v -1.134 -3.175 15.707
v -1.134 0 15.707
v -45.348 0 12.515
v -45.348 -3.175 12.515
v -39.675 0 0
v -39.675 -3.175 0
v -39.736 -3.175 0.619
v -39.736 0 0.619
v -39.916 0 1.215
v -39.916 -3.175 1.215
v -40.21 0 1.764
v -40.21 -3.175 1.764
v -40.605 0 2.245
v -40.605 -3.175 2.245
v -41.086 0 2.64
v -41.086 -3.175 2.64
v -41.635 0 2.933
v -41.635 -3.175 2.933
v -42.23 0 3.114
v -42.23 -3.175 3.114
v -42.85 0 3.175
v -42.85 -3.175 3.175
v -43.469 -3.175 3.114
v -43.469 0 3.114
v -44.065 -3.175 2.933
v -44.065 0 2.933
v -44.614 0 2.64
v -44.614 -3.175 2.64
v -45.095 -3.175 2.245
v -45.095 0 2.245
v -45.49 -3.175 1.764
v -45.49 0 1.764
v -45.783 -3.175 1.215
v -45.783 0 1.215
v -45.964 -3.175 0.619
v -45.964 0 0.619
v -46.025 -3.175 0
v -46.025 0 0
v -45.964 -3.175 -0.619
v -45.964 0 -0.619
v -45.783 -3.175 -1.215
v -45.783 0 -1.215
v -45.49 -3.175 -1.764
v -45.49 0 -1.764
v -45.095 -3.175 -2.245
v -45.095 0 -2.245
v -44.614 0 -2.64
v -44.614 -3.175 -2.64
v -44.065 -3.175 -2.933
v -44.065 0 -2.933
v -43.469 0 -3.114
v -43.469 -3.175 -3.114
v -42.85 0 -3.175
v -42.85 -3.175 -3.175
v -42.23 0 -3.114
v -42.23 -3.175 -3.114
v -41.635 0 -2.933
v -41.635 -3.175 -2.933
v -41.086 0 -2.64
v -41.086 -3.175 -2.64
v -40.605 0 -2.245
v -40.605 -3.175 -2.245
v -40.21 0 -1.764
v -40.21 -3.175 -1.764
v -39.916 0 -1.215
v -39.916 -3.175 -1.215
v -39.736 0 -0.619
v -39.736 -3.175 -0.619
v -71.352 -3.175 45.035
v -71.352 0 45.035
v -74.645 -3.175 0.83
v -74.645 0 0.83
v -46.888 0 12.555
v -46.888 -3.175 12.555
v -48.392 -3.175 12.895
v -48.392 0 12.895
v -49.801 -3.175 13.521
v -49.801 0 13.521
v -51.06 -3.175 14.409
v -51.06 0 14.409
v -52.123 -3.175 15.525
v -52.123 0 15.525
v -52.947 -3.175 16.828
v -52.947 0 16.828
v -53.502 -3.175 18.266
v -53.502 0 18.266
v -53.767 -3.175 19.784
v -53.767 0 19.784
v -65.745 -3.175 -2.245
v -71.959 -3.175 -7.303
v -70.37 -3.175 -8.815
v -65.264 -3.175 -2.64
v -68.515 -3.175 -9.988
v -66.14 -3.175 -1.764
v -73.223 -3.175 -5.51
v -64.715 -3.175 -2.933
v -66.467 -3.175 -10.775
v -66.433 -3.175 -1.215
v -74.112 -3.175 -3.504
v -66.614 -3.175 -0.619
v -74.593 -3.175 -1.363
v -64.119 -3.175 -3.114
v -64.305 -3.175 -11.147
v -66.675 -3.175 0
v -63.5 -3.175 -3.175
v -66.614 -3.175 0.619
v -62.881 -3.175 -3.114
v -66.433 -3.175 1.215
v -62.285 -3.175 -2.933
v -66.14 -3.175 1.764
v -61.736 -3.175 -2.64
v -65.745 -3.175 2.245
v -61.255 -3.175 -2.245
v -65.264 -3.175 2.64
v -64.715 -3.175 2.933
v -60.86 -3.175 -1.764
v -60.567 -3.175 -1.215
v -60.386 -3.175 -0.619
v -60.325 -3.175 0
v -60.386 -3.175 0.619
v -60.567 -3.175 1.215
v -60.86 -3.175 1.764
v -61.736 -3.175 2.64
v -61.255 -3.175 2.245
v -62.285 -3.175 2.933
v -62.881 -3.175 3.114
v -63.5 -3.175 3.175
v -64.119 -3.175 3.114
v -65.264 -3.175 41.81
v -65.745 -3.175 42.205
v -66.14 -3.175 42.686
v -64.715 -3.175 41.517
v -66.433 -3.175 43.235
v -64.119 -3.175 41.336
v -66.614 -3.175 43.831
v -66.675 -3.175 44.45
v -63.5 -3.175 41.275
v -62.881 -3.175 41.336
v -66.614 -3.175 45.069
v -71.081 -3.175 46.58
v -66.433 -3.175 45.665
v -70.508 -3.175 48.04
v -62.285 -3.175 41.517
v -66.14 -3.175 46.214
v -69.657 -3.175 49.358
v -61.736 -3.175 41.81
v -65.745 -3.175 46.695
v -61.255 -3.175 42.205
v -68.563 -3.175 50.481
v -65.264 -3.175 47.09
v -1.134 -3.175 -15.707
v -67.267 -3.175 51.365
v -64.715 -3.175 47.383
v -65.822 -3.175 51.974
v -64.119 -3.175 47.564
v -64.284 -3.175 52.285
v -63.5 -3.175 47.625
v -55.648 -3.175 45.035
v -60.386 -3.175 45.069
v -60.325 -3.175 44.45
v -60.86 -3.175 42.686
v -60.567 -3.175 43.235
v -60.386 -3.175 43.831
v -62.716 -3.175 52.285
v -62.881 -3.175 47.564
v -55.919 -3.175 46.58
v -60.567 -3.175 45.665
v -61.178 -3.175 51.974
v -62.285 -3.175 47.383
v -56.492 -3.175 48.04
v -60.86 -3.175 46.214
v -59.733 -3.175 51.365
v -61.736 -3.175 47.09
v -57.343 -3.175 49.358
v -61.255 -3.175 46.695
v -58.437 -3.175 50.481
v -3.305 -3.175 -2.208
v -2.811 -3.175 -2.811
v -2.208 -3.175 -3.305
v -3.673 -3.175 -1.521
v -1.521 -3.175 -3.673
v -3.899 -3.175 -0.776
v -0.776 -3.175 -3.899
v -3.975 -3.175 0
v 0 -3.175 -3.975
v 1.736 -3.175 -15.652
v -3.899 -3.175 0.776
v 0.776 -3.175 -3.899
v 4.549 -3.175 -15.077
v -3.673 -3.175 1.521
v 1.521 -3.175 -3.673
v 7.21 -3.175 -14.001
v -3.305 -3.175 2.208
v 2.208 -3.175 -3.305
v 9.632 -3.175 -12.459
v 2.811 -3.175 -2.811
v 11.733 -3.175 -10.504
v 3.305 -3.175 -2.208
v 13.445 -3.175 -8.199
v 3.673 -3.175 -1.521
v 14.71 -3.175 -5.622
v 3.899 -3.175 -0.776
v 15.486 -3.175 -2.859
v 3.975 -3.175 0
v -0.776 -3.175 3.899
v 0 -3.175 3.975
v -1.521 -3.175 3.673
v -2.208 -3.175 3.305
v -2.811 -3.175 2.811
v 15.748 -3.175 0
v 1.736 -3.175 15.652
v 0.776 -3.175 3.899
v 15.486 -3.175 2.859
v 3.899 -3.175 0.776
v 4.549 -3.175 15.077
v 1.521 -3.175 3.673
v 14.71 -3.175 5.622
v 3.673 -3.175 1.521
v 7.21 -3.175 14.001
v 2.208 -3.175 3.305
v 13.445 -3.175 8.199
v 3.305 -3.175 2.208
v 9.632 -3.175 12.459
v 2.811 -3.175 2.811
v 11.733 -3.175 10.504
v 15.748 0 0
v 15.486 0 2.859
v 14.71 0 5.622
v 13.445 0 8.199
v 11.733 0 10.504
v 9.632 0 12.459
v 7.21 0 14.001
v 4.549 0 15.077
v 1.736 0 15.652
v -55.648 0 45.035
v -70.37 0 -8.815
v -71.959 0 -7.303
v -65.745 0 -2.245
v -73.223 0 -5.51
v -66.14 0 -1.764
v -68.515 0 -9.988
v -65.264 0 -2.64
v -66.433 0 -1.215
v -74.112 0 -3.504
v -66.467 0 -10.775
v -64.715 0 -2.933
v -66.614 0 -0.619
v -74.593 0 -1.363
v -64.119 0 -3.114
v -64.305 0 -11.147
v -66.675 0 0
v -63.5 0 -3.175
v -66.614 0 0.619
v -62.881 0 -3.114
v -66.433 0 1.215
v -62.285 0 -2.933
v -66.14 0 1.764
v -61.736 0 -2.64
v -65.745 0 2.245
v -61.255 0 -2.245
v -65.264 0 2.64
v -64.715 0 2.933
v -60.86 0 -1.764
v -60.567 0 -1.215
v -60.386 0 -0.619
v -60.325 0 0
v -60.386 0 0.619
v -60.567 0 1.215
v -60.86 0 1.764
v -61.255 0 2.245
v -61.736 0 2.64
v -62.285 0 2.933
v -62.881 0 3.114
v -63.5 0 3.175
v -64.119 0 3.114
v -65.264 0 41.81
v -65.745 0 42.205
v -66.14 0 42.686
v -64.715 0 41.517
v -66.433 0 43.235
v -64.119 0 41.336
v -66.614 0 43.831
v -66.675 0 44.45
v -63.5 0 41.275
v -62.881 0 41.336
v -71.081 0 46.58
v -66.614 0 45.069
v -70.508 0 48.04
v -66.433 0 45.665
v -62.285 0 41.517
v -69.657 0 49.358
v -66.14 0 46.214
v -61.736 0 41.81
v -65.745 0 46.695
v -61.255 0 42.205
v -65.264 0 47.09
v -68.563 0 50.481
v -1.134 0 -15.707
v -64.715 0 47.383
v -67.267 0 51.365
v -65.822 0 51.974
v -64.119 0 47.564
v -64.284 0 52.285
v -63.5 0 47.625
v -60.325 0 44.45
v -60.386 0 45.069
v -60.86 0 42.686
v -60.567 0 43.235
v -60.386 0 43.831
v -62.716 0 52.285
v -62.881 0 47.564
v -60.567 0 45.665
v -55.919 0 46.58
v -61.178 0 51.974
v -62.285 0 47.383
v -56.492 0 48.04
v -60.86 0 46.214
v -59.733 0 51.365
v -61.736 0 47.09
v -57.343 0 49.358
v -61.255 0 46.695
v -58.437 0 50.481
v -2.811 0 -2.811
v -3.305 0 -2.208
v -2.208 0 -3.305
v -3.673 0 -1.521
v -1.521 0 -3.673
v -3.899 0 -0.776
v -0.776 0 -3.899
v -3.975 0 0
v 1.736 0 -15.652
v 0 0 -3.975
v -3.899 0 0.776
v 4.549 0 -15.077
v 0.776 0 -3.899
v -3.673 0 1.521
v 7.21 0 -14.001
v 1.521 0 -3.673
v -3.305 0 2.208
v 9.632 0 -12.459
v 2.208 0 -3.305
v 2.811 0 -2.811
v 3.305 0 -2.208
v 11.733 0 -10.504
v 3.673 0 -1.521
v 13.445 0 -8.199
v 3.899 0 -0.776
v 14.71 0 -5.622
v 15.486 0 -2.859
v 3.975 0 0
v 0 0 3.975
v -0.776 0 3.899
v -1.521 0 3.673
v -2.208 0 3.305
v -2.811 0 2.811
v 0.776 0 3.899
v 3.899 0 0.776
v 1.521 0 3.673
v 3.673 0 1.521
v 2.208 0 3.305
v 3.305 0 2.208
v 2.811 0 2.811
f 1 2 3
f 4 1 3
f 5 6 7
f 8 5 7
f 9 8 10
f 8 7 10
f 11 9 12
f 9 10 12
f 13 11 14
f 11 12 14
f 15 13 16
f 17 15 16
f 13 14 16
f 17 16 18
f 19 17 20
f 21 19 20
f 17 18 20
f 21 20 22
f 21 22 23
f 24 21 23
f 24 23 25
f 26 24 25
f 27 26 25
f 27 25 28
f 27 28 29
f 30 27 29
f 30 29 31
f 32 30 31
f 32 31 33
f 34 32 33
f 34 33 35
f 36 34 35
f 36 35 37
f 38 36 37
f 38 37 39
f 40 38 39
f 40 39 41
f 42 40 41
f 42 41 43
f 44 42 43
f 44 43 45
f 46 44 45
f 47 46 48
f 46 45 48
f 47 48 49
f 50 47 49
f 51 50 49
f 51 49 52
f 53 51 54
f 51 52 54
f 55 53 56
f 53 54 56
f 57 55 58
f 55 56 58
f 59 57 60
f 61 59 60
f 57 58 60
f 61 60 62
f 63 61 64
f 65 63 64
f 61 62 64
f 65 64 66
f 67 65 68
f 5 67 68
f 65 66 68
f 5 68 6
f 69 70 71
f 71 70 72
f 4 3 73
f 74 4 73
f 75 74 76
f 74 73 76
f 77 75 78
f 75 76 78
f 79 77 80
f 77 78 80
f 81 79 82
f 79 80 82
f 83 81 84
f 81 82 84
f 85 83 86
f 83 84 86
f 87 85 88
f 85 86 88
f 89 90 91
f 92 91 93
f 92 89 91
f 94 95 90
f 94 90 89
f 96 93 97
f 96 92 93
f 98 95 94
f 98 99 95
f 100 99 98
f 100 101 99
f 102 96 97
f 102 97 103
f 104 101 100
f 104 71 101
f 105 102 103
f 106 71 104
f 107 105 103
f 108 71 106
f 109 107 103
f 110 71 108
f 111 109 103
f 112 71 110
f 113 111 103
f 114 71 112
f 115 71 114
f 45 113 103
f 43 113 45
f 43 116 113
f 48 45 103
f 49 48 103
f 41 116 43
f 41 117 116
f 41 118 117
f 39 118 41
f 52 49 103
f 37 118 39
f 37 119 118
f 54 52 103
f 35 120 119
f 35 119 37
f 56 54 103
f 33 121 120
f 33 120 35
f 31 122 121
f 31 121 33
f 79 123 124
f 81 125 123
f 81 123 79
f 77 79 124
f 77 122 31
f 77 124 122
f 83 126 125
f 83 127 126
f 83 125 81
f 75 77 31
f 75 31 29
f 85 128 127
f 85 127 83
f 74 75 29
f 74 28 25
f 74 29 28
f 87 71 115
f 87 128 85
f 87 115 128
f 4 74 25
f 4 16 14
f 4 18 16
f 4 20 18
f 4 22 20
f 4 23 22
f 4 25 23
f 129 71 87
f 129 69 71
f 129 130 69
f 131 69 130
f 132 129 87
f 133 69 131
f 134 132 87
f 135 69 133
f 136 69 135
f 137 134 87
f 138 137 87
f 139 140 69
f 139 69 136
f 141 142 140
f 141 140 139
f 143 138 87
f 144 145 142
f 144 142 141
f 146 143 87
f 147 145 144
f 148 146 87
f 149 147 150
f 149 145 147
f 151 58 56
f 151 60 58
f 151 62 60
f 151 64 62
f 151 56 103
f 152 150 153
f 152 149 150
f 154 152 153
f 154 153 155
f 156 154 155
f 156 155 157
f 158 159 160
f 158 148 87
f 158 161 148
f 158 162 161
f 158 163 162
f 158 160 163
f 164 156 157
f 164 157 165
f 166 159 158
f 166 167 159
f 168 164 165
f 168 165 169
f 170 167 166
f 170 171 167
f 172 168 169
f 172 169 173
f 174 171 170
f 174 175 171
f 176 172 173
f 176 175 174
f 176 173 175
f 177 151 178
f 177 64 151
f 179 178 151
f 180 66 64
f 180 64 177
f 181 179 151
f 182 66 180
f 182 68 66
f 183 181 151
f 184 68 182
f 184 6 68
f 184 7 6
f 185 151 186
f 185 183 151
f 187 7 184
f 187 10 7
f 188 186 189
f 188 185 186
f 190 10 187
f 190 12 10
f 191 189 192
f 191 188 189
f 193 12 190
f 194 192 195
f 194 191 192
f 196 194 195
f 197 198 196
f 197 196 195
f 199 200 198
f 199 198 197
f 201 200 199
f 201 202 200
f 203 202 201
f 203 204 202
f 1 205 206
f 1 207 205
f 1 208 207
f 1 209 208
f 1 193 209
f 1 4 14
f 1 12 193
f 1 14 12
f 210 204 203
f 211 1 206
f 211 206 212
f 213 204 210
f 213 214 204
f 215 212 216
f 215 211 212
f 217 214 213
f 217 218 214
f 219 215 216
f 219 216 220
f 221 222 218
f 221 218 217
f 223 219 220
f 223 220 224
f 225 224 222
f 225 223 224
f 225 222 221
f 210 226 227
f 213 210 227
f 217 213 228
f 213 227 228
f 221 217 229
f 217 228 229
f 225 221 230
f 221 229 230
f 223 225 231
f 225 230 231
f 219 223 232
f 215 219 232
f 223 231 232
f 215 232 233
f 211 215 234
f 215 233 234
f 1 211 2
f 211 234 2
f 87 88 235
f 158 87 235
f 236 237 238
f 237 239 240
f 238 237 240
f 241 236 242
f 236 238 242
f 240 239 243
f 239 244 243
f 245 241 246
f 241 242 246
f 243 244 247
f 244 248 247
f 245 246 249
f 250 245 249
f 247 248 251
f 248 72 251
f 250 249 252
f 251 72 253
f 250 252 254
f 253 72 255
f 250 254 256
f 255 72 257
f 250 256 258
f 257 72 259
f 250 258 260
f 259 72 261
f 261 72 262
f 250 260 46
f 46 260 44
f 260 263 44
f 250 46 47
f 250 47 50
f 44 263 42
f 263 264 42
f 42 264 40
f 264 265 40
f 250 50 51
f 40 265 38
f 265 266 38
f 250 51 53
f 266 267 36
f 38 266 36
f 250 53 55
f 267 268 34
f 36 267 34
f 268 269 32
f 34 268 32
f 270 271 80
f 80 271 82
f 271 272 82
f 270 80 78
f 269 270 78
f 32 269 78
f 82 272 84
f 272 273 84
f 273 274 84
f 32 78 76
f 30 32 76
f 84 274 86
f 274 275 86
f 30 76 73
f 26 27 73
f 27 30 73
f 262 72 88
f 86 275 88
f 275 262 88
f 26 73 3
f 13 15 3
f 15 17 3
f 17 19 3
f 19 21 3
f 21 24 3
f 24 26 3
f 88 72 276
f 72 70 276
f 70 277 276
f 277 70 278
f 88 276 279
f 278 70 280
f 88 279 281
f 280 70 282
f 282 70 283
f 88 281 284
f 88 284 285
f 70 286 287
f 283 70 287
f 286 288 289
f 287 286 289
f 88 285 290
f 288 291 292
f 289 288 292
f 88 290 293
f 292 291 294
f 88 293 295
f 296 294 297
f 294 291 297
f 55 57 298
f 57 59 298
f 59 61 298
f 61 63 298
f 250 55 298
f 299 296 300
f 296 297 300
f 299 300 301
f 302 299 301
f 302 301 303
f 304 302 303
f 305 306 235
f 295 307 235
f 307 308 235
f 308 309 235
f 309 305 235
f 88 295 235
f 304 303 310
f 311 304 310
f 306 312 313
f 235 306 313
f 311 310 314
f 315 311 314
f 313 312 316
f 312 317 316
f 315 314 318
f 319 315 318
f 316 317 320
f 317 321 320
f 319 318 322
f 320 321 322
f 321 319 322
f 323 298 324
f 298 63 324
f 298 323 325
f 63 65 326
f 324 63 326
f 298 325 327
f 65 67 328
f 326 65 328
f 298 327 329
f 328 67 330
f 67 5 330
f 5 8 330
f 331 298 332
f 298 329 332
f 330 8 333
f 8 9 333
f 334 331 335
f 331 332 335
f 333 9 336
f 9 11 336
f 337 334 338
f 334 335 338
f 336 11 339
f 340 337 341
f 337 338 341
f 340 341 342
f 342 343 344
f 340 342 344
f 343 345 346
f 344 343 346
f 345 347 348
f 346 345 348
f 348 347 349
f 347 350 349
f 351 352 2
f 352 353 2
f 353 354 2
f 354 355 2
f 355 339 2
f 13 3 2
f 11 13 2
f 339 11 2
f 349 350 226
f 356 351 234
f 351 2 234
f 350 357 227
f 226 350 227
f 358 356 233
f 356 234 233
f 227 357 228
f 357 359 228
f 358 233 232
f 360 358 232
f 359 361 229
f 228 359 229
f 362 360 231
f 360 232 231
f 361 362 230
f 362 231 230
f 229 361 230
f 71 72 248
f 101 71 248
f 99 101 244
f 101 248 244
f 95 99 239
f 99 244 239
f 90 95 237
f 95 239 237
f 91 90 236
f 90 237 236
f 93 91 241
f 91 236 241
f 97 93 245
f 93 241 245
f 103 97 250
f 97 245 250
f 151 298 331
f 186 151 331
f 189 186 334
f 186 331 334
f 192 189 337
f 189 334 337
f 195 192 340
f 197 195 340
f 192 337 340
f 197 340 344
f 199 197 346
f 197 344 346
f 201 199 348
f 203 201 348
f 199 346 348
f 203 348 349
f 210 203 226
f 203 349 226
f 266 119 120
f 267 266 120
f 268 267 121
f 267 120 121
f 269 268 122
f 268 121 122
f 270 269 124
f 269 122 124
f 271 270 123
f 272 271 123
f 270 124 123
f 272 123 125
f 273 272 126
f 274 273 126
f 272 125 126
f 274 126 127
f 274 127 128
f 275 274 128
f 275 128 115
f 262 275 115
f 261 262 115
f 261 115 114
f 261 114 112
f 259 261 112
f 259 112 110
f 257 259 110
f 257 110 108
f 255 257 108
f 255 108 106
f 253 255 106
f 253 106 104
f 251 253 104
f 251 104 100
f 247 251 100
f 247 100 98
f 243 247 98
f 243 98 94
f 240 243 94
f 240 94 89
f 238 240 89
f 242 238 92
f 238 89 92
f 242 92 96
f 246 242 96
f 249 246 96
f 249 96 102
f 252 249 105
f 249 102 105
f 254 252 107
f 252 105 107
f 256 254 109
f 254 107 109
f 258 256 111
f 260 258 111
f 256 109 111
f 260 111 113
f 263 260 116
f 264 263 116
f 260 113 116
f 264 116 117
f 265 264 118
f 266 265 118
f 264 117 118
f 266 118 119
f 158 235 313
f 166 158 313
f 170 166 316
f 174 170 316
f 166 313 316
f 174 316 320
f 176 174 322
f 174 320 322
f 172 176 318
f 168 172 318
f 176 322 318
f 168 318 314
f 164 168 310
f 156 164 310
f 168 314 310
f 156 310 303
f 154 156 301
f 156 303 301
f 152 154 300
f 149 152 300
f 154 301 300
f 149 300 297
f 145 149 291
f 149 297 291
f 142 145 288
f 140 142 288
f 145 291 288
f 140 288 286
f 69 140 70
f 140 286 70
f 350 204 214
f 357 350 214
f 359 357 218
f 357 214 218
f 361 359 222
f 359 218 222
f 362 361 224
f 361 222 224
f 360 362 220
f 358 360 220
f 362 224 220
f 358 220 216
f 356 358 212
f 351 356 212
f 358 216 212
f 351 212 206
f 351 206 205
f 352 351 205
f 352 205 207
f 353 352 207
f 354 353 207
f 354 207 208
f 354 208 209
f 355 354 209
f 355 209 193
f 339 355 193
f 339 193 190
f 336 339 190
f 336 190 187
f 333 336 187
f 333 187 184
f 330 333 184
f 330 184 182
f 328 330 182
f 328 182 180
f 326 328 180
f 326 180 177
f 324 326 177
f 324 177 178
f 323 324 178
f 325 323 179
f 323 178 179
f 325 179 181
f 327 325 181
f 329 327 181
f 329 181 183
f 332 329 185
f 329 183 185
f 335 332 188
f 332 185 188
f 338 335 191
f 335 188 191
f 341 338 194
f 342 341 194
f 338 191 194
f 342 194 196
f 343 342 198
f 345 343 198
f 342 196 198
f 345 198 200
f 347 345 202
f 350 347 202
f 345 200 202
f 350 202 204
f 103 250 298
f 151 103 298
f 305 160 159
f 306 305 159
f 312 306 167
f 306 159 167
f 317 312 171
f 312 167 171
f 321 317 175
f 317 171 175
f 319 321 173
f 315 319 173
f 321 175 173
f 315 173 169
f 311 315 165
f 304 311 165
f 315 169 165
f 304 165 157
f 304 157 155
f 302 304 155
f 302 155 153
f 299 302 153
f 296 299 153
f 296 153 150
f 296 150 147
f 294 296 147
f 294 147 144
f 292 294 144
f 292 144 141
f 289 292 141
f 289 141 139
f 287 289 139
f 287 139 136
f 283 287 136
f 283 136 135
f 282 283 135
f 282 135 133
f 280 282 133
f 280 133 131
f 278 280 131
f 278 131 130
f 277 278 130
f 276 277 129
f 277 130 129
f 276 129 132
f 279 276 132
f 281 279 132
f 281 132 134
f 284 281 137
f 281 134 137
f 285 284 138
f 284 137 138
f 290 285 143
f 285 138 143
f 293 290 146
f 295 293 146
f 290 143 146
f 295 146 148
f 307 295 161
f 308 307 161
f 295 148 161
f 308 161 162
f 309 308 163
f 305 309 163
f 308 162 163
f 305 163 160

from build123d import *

# Parameters (mm, degrees)
F1_DEPTH = 3.175
F2_R     = 3.9751
F2_R_2   = 3.175
F3_DEPTH = 3.176


with BuildPart() as f1:
    # F0 (on Front) → F1 (new body)
    with BuildSketch(Plane.XZ):
        with BuildLine():
            ThreePointArc((-1.133856, -15.7071281452), (10.7271510596, -11.5294290467), (15.748, 0))
            ThreePointArc((15.748, 0), (10.7271378512, 11.529441336), (-1.1338919889, 15.7071255473))
            ThreePointArc((-1.1338919889, 15.7071255473), (-11.529441336, 10.7271378512), (-15.748, 0))
            ThreePointArc((-15.748, 0), (-11.5294290467, -10.7271510596), (-1.133856, -15.7071281452))
        make_face()
        with BuildLine():
            ThreePointArc((-15.748, 0), (-11.529441336, 10.7271378512), (-1.1338919889, 15.7071255473))
            Line((-1.1338919889, 15.7071255473), (-45.34766523, 12.5153484696))
            ThreePointArc((-45.34766523, 12.5153484696), (-51.0602172111, 14.4088260903), (-53.7668572171, 19.7840105071))
            Line((-53.7668572171, 19.7840105071), (-55.6477540074, 45.0349007362))
            ThreePointArc((-55.6477540074, 45.0349007362), (-55.6314403813, 44.7426525705), (-55.626, 44.45))
            ThreePointArc((-55.626, 44.45), (-57.9322412049, 38.8822412049), (-63.5, 36.576))
            ThreePointArc((-63.5, 36.576), (-69.270857002, 39.0930339311), (-71.352244132, 45.0349257143))
            Line((-71.352244132, 45.0349257143), (-74.6451207035, 0.8302171429))
            ThreePointArc((-74.6451207035, 0.8302171429), (-63.0846043948, 11.1682775078), (-52.324, 0))
            ThreePointArc((-52.324, 0), (-55.887183119, -8.1821754525), (-64.304672, -11.1469941676))
            Line((-64.304672, -11.1469941676), (-1.133856, -15.7071281452))
            ThreePointArc((-1.133856, -15.7071281452), (-11.5294290467, -10.7271510596), (-15.748, 0))
        make_face()
        with BuildLine():
            ThreePointArc((-74.6451207035, 0.8302171429), (-71.9594789501, -7.3034369917), (-64.304672, -11.1469941676))
            ThreePointArc((-64.304672, -11.1469941676), (-55.887183119, -8.1821754525), (-52.324, 0))
            ThreePointArc((-52.324, 0), (-63.0846043948, 11.1682775078), (-74.6451207035, 0.8302171429))
        make_face()
        with BuildLine():
            ThreePointArc((-55.626, 44.45), (-55.6314403813, 44.7426525705), (-55.6477540074, 45.0349007362))
            ThreePointArc((-55.6477540074, 45.0349007362), (-63.4999874763, 52.324), (-71.352244132, 45.0349257143))
            ThreePointArc((-71.352244132, 45.0349257143), (-69.270857002, 39.0930339311), (-63.5, 36.576))
            ThreePointArc((-63.5, 36.576), (-57.9322412049, 38.8822412049), (-55.626, 44.45))
        make_face()
    extrude(amount=F1_DEPTH)

    # F2 (on face) → F3 (cut, through all)
    with BuildSketch(Plane.XZ.offset(3.175)):
        Circle(F2_R)
        with Locations((-63.5, 0)):
            Circle(F2_R_2)
        with Locations((-42.8498, 0)):
            Circle(F2_R_2)
        with Locations((-63.5, 44.45)):
            Circle(F2_R_2)
    extrude(amount=-F3_DEPTH, mode=Mode.SUBTRACT)


solid = f1.part
